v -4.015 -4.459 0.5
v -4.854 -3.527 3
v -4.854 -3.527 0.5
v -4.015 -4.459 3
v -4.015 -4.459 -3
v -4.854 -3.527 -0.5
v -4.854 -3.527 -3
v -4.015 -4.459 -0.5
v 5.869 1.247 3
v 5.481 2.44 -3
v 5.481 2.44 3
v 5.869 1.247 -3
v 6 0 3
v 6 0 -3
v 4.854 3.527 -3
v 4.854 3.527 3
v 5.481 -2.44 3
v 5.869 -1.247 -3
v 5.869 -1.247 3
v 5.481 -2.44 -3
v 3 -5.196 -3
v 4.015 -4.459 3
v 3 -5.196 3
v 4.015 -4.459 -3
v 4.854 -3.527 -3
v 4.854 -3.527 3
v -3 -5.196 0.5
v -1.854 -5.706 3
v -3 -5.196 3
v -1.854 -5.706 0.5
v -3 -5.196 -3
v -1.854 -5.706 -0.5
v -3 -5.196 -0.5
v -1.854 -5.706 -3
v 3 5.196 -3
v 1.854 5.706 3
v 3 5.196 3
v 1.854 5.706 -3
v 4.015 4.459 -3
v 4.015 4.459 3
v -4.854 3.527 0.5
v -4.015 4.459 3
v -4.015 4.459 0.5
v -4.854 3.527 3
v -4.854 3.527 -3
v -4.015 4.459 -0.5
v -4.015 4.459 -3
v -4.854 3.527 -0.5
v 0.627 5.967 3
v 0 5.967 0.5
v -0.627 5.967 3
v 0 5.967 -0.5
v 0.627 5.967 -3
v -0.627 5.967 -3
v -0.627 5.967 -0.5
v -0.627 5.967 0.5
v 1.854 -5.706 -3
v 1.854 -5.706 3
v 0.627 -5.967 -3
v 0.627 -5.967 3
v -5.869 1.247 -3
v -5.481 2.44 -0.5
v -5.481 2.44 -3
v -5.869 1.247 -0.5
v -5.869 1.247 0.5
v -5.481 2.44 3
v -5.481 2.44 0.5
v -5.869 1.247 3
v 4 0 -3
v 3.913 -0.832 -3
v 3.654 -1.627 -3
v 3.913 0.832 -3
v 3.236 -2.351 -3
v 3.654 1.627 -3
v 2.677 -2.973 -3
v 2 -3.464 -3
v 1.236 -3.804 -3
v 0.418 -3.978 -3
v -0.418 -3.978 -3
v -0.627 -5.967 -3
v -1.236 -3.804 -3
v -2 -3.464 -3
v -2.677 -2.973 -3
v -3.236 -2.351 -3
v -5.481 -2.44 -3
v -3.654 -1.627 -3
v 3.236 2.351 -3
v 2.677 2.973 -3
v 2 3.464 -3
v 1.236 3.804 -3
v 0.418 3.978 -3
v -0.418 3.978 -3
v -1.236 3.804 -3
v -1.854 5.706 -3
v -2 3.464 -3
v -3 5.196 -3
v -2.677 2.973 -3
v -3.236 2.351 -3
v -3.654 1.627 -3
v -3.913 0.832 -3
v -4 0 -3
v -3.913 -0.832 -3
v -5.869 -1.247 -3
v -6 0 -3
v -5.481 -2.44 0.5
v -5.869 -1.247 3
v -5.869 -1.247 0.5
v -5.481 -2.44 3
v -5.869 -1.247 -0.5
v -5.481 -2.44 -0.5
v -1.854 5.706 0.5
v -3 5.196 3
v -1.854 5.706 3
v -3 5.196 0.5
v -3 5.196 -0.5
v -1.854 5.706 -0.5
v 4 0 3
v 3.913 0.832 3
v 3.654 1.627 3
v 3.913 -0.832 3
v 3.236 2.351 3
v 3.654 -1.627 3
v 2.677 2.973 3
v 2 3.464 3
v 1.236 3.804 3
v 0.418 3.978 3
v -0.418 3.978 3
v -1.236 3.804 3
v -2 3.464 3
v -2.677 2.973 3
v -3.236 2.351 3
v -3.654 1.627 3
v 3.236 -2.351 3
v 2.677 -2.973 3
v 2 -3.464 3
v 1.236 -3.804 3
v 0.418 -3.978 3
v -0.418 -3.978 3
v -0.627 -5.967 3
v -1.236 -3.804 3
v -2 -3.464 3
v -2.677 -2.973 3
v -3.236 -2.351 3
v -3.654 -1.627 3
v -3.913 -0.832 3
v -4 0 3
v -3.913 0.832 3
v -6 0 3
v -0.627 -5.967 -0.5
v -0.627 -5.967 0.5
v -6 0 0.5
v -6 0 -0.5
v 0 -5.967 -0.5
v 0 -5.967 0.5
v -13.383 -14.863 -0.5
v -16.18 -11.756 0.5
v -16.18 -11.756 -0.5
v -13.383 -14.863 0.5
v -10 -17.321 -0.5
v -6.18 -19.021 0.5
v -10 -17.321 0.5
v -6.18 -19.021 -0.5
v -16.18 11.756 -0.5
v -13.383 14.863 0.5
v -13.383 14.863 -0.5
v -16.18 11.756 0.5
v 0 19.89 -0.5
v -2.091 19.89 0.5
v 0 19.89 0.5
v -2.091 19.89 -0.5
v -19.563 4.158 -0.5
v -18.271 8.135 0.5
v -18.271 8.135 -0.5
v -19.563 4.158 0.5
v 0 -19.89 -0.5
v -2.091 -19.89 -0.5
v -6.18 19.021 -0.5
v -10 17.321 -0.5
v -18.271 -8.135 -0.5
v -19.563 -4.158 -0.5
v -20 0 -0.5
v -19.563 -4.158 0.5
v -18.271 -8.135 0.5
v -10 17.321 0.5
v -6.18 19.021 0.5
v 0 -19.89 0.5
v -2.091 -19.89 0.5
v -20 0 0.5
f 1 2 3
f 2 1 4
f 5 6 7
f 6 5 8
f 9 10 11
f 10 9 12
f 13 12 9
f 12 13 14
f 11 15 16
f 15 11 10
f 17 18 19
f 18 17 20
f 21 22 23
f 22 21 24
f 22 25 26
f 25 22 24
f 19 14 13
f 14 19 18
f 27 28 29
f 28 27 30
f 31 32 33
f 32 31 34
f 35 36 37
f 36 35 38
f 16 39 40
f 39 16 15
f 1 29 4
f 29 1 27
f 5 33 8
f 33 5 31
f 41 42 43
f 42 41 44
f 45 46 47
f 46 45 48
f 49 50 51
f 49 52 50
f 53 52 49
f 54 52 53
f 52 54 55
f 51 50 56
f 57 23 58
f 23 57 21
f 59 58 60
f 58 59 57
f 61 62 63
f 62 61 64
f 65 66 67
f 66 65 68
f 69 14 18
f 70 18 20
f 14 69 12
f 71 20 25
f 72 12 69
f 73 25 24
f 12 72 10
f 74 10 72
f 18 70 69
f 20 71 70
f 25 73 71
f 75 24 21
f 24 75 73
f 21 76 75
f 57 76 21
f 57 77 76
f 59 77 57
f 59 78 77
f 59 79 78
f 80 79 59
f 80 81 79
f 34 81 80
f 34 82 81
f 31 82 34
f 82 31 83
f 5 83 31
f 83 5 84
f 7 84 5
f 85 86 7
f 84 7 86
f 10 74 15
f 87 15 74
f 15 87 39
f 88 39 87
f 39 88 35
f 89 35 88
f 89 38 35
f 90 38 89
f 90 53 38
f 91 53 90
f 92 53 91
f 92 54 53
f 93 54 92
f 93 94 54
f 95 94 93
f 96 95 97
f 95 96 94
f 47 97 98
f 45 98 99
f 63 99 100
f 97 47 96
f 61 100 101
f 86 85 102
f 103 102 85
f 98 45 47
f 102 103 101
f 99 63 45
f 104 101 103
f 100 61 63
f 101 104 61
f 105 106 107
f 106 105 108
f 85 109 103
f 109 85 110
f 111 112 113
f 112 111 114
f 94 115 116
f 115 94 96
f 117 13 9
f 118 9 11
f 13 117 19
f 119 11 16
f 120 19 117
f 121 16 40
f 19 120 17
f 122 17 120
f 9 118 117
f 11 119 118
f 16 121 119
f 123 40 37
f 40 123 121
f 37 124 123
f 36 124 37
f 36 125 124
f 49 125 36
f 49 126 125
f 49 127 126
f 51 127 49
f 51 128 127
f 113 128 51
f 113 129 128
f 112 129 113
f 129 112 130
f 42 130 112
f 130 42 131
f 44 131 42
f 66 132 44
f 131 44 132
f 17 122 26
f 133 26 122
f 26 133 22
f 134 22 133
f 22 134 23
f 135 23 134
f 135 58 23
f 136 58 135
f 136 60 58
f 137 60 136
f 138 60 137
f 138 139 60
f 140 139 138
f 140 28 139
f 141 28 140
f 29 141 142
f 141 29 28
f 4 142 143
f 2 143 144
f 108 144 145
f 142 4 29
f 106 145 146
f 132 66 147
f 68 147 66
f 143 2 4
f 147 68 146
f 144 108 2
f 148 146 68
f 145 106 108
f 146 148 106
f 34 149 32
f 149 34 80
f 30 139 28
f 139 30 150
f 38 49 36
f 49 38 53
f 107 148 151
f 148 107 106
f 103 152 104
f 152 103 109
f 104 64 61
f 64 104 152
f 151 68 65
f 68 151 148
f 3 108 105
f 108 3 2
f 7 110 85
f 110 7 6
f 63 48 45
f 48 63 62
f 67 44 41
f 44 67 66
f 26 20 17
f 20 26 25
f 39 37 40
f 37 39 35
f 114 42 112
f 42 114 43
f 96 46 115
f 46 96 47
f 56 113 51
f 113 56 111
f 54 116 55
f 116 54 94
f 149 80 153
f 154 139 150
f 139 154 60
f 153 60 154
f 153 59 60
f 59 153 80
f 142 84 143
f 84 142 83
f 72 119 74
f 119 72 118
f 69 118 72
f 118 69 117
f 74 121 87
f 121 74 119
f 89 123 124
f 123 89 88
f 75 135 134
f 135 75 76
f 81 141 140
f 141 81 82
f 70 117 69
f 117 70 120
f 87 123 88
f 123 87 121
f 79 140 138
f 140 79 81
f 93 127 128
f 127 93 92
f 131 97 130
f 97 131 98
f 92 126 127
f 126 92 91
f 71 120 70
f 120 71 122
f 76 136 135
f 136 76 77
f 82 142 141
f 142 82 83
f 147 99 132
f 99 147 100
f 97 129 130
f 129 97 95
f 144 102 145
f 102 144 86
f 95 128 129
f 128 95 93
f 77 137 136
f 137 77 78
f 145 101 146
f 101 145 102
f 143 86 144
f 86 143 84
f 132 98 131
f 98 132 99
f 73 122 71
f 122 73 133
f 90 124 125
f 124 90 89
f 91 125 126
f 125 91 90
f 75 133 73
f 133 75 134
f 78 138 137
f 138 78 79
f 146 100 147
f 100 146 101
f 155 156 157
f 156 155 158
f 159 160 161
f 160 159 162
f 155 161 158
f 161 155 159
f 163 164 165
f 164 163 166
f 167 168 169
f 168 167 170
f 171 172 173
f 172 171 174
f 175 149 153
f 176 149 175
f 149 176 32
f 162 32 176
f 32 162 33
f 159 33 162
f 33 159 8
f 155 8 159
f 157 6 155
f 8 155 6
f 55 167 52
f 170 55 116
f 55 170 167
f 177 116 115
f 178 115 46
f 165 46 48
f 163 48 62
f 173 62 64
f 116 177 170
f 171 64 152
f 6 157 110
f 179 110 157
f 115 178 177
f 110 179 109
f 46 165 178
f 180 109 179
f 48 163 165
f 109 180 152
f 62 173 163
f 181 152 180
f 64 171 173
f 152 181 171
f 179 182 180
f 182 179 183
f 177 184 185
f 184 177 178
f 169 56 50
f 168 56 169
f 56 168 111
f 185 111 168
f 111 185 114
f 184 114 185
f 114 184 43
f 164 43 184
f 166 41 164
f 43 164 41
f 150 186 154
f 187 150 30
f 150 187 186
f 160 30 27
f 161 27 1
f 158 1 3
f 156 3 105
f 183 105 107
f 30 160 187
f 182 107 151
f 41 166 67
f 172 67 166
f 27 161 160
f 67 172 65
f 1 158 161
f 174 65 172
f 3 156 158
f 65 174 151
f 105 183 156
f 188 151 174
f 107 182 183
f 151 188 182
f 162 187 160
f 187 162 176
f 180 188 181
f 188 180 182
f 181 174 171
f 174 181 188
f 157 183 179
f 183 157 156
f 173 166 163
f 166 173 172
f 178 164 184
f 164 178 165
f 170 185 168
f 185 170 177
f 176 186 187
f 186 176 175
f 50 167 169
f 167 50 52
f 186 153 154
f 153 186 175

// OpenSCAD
$fn=30;
inner_diameter=8;
outer_diameter=20;
extra=2;
thickness=1;
total_thickness=6;

difference(){
cylinder(r=inner_diameter/2+extra, h=total_thickness,center=true);
    cylinder(r=inner_diameter/2, h=total_thickness,center=true);
}

difference(){
cylinder(r=outer_diameter, h=thickness,center=true);
    translate([100,0,0]) cube([200,200,200],center=true);
    cylinder(r=inner_diameter/2, h=total_thickness,center=true);
}
